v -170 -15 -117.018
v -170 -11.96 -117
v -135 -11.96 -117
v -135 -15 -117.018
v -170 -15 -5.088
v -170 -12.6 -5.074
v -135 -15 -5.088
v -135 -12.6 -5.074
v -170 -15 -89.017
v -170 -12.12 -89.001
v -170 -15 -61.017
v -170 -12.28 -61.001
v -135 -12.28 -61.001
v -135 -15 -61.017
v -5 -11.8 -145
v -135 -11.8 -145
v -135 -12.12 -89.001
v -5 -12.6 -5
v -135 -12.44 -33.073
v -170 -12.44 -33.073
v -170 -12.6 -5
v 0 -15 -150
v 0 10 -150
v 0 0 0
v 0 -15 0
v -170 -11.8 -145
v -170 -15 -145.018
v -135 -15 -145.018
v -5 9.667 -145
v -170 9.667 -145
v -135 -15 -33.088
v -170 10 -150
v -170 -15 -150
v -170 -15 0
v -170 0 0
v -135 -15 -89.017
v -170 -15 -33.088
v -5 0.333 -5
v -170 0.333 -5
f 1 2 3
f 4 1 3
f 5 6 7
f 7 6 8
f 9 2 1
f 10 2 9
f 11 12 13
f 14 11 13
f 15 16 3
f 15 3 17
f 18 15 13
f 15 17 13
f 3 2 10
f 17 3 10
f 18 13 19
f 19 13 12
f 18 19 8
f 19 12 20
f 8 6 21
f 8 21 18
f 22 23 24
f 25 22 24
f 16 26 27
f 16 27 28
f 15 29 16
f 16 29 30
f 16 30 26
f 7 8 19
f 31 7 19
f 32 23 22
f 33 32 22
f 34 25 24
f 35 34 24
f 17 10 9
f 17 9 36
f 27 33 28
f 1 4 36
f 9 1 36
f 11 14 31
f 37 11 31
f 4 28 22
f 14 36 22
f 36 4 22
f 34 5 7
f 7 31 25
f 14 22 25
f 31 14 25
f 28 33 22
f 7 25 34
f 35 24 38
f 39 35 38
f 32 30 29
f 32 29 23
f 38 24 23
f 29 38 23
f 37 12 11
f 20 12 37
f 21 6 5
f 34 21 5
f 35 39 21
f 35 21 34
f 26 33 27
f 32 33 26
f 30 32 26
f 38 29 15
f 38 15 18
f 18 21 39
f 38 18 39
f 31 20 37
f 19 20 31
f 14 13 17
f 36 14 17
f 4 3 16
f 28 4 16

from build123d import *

# Parameters (mm, degrees)
BOSS_EXTRUDE1_DEPTH = 170
CUT_EXTRUDE1_DEPTH  = 165
SKETCH5_W           = 35
SKETCH5_H           = 28
CUT_EXTRUDE3_DEPTH  = 228.794623549
SKETCH6_W           = 35
SKETCH6_H           = 28
CUT_EXTRUDE5_DEPTH  = 228.794623549
SKETCH8_W           = 35
SKETCH8_H           = 28
CUT_EXTRUDE9_DEPTH  = 228.794623549


with BuildPart() as part:
    # Sketch2 → Boss-Extrude1 (new body)
    with BuildSketch(Plane(origin=(0, 0, 0), x_dir=(0, 0, -1), z_dir=(1, 0, 0))):
        Polygon((150, 10), (150, -15), (0, -15), (0, 0), align=None)
    extrude(amount=-BOSS_EXTRUDE1_DEPTH)

    # Sketch3 → Cut-Extrude1 (cut)
    with BuildSketch(Plane.ZY.offset(170)):
        Polygon((-145, 9.666666667), (-145, -11.8), (-5, -12.6), (-5, 0.333333333), align=None)
    extrude(amount=-CUT_EXTRUDE1_DEPTH, mode=Mode.SUBTRACT)

    # Sketch5 → Cut-Extrude3 (cut, through all)
    with BuildSketch(Plane(origin=(0, -12.628159081, -0.072160909), x_dir=(1, 0, 0), z_dir=(0, 0.9999836738692104, 0.005714192422109776))):
        with Locations((-152.5, 130.93020524)):
            Rectangle(SKETCH5_W, SKETCH5_H)
    extrude(amount=-CUT_EXTRUDE3_DEPTH, mode=Mode.SUBTRACT)

    # Sketch6 → Cut-Extrude5 (cut, through all)
    with BuildSketch(Plane(origin=(0, -12.628159081, -0.072160909), x_dir=(1, 0, 0), z_dir=(0, 0.9999836738692104, 0.005714192422109776))):
        with Locations((-152.5, 74.93020524)):
            Rectangle(SKETCH6_W, SKETCH6_H)
    extrude(amount=-CUT_EXTRUDE5_DEPTH, mode=Mode.SUBTRACT)

    # Sketch8 → Cut-Extrude9 (cut, through all)
    with BuildSketch(Plane(origin=(0, -12.628159081, -0.072160909), x_dir=(1, 0, 0), z_dir=(0, 0.9999836738692104, 0.005714192422109776))):
        with Locations((-152.5, 19.0018231)):
            Rectangle(SKETCH8_W, SKETCH8_H)
    extrude(amount=-CUT_EXTRUDE9_DEPTH, mode=Mode.SUBTRACT)


solid = part.part
